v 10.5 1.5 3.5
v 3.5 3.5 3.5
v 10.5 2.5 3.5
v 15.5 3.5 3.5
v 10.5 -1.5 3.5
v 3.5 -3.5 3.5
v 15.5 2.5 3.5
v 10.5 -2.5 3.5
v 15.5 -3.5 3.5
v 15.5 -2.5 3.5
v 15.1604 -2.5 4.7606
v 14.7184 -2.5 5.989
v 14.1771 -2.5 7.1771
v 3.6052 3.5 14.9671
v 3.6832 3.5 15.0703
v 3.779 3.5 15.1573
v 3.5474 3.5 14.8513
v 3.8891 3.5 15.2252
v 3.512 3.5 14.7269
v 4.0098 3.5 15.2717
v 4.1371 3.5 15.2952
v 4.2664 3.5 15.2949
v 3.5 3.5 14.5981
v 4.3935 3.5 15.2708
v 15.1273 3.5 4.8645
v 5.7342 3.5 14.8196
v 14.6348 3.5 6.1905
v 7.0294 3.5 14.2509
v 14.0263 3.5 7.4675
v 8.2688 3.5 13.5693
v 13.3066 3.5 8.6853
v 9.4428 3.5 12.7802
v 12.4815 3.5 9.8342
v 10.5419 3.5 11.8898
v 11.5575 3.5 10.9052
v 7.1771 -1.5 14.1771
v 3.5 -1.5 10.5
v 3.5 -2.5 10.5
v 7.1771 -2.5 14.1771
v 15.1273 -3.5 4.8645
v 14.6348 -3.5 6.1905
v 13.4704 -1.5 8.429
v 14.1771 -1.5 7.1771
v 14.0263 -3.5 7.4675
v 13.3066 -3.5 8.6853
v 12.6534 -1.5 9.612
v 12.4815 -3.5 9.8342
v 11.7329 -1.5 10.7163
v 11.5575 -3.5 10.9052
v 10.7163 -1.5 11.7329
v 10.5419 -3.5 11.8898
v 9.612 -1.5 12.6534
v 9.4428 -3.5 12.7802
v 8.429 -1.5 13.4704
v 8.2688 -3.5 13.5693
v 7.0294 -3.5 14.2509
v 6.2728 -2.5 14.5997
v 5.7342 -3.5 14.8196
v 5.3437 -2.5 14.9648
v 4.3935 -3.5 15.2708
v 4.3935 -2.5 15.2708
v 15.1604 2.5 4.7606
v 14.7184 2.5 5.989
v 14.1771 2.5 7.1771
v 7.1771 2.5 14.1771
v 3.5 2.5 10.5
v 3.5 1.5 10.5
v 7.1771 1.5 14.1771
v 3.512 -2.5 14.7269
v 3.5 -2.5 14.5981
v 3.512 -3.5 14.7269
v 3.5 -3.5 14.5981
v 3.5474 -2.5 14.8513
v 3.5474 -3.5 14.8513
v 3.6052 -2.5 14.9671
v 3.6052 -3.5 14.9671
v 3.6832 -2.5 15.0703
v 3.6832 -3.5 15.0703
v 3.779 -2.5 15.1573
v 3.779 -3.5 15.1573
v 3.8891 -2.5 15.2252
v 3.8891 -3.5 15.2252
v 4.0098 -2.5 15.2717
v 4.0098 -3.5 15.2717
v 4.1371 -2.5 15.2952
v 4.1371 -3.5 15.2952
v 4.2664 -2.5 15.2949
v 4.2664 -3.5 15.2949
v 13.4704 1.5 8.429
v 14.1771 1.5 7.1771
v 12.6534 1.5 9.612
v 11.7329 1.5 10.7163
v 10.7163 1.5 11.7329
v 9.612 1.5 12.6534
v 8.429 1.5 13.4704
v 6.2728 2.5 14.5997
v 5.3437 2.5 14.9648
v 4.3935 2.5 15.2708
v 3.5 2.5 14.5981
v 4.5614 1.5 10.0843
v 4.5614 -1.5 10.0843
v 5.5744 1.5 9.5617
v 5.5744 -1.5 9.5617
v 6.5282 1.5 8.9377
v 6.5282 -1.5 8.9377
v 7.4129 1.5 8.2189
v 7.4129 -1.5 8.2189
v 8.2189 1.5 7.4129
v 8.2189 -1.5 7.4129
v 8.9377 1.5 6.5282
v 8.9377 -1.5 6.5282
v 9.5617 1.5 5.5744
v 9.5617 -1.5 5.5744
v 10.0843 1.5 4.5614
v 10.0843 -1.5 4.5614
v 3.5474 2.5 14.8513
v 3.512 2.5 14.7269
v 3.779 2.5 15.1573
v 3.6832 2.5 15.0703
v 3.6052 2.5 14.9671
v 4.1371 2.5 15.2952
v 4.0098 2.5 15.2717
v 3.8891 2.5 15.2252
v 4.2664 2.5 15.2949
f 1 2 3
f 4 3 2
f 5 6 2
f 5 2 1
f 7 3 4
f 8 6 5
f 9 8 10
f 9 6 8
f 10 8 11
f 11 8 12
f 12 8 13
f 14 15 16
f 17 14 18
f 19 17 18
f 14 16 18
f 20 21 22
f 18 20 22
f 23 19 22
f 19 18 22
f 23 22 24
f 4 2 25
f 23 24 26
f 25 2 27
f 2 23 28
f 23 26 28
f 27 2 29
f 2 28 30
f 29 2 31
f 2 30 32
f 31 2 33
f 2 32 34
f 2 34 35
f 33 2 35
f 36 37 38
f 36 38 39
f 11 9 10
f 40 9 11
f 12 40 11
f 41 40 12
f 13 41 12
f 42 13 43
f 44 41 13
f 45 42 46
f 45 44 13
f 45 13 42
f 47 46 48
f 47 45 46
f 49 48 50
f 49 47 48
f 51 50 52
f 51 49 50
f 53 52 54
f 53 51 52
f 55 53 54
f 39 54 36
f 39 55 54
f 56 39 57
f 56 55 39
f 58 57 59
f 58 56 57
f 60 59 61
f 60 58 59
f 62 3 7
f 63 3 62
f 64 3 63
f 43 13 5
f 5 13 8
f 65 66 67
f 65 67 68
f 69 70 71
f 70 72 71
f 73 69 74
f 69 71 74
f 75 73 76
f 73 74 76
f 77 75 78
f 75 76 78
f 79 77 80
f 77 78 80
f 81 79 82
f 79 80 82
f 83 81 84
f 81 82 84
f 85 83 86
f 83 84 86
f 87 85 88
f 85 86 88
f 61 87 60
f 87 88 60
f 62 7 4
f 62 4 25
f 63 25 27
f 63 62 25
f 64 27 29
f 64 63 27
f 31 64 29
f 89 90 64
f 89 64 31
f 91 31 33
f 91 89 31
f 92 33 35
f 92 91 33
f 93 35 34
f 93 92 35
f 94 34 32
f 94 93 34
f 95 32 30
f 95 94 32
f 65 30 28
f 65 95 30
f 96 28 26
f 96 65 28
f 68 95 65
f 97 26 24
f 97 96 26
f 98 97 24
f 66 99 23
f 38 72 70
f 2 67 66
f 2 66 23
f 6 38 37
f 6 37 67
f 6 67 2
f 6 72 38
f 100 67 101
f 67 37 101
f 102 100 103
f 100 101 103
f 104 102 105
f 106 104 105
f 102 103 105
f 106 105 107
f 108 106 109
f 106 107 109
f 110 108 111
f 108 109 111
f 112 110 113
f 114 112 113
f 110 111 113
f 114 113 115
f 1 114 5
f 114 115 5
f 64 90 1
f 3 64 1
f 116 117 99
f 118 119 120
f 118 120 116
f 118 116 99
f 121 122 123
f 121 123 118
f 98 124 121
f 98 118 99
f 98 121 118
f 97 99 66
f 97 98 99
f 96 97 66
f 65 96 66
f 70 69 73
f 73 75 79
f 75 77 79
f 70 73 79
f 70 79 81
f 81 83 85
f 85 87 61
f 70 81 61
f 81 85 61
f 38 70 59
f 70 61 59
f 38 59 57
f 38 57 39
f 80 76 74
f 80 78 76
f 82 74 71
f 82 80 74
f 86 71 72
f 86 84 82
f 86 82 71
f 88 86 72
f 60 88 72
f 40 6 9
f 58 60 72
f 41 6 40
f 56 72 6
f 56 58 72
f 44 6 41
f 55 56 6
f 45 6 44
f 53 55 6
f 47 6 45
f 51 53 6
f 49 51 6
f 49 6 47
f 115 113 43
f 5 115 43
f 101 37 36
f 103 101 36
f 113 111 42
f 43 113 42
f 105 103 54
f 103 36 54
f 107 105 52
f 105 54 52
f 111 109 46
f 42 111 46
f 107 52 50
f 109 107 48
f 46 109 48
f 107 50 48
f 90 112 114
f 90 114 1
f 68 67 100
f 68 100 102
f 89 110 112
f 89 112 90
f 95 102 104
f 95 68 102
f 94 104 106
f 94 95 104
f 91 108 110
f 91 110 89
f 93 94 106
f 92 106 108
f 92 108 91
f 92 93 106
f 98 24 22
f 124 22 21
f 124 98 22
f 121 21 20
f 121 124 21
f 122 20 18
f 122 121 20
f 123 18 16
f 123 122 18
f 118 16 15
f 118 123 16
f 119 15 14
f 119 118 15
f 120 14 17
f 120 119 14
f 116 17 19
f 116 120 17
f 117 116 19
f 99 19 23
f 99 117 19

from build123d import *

# Parameters (mm, degrees)
F1_DEPTH = 3.5
F3_DEPTH = 1.5
F5_DEPTH = 2.5
F6_R     = 0.7


with BuildPart() as f1:
    # F0 (on Front) → F1 (new body, symmetric)
    with BuildSketch(Plane.XZ):
        with BuildLine():
            ThreePointArc((15.5, 3.5), (11.2361025271, 11.2361025271), (3.5, 15.5))
            Line((3.5, 15.5), (3.5, 3.5))
            Line((3.5, 3.5), (15.5, 3.5))
        make_face()
    extrude(amount=F1_DEPTH, both=True)

    # F2 (on Front) → F3 (cut, symmetric)
    with BuildSketch(Plane.XZ):
        with BuildLine():
            ThreePointArc((3.5, 10.5), (7.8262379212, 7.8262379212), (10.5, 3.5))
            Line((10.5, 3.5), (15.5, 3.5))
            ThreePointArc((15.5, 3.5), (11.2361025271, 11.2361025271), (3.5, 15.5))
            Line((3.5, 15.5), (3.5, 10.5))
        make_face()
    extrude(amount=F3_DEPTH, both=True, mode=Mode.SUBTRACT)

    # F4 (on Front) → F5 (cut, symmetric)
    with BuildSketch(Plane.XZ):
        with BuildLine():
            ThreePointArc((7.177078252, 14.177078252), (5.3793615316, 14.9520055348), (3.5, 15.5))
            Line((3.5, 15.5), (3.5, 10.5))
            Line((3.5, 10.5), (7.177078252, 14.177078252))
        make_face()
        with BuildLine():
            Line((14.177078252, 7.177078252), (10.5, 3.5))
            Line((10.5, 3.5), (15.5, 3.5))
            ThreePointArc((15.5, 3.5), (14.9520055348, 5.3793615316), (14.177078252, 7.177078252))
        make_face()
    extrude(amount=F5_DEPTH, both=True, mode=Mode.SUBTRACT)

    # F6
    f6_edges = [f1.edges().sort_by_distance(p)[0] for p in [
        (3.5, 3, 15.5),
        (3.5, -3, 15.5),
    ]]
    fillet(f6_edges, radius=F6_R)


solid = f1.part
